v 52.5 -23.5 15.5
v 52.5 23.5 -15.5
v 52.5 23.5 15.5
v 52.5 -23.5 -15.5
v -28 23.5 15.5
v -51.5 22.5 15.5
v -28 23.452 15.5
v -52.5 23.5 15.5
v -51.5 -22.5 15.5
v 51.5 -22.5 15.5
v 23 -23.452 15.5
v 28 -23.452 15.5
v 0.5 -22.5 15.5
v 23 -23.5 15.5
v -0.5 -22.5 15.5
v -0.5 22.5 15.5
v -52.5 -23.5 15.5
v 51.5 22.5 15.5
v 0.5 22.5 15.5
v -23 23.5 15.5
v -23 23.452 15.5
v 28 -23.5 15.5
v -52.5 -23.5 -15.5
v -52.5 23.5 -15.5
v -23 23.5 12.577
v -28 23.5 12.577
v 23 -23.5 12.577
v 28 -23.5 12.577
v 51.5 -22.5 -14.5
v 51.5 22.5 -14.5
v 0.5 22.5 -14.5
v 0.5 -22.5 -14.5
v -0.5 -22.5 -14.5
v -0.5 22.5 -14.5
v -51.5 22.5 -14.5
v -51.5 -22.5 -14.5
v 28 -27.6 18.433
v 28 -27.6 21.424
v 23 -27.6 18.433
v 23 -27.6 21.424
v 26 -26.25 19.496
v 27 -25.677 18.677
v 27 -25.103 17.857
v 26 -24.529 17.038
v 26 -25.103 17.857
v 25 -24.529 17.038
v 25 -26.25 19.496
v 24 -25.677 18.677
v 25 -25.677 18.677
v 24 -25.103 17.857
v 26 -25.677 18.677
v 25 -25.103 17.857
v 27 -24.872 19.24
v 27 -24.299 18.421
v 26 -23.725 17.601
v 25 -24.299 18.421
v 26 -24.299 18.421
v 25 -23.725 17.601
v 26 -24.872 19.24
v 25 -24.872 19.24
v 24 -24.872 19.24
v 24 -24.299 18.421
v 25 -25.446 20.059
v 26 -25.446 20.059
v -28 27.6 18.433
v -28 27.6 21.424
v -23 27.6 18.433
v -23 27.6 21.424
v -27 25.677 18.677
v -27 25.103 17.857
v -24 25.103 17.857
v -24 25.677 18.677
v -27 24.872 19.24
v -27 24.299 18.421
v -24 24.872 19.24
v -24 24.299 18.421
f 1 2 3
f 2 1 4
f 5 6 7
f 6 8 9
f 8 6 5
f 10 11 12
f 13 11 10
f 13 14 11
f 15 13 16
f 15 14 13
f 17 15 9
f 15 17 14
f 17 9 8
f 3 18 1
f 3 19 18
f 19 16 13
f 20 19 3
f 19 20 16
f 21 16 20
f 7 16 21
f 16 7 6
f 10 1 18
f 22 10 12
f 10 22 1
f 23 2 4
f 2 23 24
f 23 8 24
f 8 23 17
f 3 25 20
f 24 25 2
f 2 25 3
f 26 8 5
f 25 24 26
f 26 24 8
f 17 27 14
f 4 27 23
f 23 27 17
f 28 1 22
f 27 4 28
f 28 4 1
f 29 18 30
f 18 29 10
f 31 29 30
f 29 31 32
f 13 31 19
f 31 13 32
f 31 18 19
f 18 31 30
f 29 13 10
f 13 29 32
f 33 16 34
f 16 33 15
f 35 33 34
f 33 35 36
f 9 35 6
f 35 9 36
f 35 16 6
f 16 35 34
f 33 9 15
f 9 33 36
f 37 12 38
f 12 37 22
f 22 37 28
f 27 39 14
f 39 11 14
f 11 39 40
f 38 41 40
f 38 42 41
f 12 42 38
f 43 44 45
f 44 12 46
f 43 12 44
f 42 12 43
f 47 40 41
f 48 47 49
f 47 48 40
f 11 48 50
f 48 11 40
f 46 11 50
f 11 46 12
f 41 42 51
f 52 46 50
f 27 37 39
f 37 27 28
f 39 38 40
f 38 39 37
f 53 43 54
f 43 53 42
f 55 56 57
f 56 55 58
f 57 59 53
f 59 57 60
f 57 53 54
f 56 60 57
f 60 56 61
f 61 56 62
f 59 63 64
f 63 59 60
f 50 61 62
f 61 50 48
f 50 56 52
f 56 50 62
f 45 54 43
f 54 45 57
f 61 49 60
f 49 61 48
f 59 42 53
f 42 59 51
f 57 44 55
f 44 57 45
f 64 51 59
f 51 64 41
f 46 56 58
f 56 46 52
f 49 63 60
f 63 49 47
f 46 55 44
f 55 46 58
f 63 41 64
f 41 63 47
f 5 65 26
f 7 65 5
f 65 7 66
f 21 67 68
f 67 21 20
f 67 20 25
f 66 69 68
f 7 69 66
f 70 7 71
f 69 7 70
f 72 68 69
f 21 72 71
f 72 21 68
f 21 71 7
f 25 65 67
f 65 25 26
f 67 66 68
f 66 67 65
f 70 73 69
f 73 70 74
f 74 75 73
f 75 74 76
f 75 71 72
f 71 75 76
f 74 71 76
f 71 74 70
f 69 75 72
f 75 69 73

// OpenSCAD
/*
Battery tray for AA
Charged and ready to charge

Goal: No support material req'd

Min clearance dimensions on AA = 51mm x 15mm

To Do:
1) create sloping base
2) cutouts for access
3) 

*/

battery_len = 51;
battery_diam = 15;
battery_widenum = 3;
wall_thick = 1;
full = 150; //when you want "a lot"


union() {

	difference() { // build the box
		cube([battery_len * 2 + wall_thick * 3, battery_diam * battery_widenum + wall_thick * 2, battery_diam * 2 + wall_thick], center = true);
	
		// remove + well
		translate([(battery_len + wall_thick) / 2, 0, wall_thick]) {
			cube([battery_len, battery_diam * battery_widenum, battery_diam * 2 + wall_thick], center = true);
		}
	
		// remove - well
		translate([-(battery_len + wall_thick) / 2, 0, wall_thick]) {
			cube([battery_len, battery_diam * battery_widenum, battery_diam * 2 + wall_thick], center = true);
		}
	} // end of diff

	// add the tabs
	// + tab
	translate([battery_len/ 2, -battery_diam * 1.5 - 5.1, battery_diam + wall_thick ]) {
		union() { // this union is just to allow the ! operator to tweak the tab
			labelTab();
			#translate([0, 2.4, 2.4]) 
				rotate([-55, 0, 0]) {
					cube([3, 1, 1.5], center = true);
					cube([1, 3, 1.5], center = true);
				}
		}
	} // end translate

	// - tab
	translate([-battery_len/ 2, battery_diam * 1.5 + 5.1, battery_diam + wall_thick ]) {
	rotate([0, 0, 180])
		union() { // this union is just to allow the ! operator to tweak the tab
			labelTab();
			#translate([0, 2.4, 2.4]) 
				rotate([-55, 0, 0]) {
					cube([3, 1, 1.5], center = true);
				}
		}
	}
} // end union



module labelTab() { 
// figure out how to make this parametric another day
difference() {
	cube([5, 10, 16], center = true);
	translate([0, 5, 7])
		rotate([35, 0, 0]) {
			cube([10, 10, 20], center = true);
		}
	translate([0, -wall_thick * 3, -wall_thick *2])
		rotate([35, 0, 0]) {
			cube([10, 10, 20], center = true);
		}
	translate([0, -5, 0])
		cube([10, 10, 20], center = true);
}	
}
